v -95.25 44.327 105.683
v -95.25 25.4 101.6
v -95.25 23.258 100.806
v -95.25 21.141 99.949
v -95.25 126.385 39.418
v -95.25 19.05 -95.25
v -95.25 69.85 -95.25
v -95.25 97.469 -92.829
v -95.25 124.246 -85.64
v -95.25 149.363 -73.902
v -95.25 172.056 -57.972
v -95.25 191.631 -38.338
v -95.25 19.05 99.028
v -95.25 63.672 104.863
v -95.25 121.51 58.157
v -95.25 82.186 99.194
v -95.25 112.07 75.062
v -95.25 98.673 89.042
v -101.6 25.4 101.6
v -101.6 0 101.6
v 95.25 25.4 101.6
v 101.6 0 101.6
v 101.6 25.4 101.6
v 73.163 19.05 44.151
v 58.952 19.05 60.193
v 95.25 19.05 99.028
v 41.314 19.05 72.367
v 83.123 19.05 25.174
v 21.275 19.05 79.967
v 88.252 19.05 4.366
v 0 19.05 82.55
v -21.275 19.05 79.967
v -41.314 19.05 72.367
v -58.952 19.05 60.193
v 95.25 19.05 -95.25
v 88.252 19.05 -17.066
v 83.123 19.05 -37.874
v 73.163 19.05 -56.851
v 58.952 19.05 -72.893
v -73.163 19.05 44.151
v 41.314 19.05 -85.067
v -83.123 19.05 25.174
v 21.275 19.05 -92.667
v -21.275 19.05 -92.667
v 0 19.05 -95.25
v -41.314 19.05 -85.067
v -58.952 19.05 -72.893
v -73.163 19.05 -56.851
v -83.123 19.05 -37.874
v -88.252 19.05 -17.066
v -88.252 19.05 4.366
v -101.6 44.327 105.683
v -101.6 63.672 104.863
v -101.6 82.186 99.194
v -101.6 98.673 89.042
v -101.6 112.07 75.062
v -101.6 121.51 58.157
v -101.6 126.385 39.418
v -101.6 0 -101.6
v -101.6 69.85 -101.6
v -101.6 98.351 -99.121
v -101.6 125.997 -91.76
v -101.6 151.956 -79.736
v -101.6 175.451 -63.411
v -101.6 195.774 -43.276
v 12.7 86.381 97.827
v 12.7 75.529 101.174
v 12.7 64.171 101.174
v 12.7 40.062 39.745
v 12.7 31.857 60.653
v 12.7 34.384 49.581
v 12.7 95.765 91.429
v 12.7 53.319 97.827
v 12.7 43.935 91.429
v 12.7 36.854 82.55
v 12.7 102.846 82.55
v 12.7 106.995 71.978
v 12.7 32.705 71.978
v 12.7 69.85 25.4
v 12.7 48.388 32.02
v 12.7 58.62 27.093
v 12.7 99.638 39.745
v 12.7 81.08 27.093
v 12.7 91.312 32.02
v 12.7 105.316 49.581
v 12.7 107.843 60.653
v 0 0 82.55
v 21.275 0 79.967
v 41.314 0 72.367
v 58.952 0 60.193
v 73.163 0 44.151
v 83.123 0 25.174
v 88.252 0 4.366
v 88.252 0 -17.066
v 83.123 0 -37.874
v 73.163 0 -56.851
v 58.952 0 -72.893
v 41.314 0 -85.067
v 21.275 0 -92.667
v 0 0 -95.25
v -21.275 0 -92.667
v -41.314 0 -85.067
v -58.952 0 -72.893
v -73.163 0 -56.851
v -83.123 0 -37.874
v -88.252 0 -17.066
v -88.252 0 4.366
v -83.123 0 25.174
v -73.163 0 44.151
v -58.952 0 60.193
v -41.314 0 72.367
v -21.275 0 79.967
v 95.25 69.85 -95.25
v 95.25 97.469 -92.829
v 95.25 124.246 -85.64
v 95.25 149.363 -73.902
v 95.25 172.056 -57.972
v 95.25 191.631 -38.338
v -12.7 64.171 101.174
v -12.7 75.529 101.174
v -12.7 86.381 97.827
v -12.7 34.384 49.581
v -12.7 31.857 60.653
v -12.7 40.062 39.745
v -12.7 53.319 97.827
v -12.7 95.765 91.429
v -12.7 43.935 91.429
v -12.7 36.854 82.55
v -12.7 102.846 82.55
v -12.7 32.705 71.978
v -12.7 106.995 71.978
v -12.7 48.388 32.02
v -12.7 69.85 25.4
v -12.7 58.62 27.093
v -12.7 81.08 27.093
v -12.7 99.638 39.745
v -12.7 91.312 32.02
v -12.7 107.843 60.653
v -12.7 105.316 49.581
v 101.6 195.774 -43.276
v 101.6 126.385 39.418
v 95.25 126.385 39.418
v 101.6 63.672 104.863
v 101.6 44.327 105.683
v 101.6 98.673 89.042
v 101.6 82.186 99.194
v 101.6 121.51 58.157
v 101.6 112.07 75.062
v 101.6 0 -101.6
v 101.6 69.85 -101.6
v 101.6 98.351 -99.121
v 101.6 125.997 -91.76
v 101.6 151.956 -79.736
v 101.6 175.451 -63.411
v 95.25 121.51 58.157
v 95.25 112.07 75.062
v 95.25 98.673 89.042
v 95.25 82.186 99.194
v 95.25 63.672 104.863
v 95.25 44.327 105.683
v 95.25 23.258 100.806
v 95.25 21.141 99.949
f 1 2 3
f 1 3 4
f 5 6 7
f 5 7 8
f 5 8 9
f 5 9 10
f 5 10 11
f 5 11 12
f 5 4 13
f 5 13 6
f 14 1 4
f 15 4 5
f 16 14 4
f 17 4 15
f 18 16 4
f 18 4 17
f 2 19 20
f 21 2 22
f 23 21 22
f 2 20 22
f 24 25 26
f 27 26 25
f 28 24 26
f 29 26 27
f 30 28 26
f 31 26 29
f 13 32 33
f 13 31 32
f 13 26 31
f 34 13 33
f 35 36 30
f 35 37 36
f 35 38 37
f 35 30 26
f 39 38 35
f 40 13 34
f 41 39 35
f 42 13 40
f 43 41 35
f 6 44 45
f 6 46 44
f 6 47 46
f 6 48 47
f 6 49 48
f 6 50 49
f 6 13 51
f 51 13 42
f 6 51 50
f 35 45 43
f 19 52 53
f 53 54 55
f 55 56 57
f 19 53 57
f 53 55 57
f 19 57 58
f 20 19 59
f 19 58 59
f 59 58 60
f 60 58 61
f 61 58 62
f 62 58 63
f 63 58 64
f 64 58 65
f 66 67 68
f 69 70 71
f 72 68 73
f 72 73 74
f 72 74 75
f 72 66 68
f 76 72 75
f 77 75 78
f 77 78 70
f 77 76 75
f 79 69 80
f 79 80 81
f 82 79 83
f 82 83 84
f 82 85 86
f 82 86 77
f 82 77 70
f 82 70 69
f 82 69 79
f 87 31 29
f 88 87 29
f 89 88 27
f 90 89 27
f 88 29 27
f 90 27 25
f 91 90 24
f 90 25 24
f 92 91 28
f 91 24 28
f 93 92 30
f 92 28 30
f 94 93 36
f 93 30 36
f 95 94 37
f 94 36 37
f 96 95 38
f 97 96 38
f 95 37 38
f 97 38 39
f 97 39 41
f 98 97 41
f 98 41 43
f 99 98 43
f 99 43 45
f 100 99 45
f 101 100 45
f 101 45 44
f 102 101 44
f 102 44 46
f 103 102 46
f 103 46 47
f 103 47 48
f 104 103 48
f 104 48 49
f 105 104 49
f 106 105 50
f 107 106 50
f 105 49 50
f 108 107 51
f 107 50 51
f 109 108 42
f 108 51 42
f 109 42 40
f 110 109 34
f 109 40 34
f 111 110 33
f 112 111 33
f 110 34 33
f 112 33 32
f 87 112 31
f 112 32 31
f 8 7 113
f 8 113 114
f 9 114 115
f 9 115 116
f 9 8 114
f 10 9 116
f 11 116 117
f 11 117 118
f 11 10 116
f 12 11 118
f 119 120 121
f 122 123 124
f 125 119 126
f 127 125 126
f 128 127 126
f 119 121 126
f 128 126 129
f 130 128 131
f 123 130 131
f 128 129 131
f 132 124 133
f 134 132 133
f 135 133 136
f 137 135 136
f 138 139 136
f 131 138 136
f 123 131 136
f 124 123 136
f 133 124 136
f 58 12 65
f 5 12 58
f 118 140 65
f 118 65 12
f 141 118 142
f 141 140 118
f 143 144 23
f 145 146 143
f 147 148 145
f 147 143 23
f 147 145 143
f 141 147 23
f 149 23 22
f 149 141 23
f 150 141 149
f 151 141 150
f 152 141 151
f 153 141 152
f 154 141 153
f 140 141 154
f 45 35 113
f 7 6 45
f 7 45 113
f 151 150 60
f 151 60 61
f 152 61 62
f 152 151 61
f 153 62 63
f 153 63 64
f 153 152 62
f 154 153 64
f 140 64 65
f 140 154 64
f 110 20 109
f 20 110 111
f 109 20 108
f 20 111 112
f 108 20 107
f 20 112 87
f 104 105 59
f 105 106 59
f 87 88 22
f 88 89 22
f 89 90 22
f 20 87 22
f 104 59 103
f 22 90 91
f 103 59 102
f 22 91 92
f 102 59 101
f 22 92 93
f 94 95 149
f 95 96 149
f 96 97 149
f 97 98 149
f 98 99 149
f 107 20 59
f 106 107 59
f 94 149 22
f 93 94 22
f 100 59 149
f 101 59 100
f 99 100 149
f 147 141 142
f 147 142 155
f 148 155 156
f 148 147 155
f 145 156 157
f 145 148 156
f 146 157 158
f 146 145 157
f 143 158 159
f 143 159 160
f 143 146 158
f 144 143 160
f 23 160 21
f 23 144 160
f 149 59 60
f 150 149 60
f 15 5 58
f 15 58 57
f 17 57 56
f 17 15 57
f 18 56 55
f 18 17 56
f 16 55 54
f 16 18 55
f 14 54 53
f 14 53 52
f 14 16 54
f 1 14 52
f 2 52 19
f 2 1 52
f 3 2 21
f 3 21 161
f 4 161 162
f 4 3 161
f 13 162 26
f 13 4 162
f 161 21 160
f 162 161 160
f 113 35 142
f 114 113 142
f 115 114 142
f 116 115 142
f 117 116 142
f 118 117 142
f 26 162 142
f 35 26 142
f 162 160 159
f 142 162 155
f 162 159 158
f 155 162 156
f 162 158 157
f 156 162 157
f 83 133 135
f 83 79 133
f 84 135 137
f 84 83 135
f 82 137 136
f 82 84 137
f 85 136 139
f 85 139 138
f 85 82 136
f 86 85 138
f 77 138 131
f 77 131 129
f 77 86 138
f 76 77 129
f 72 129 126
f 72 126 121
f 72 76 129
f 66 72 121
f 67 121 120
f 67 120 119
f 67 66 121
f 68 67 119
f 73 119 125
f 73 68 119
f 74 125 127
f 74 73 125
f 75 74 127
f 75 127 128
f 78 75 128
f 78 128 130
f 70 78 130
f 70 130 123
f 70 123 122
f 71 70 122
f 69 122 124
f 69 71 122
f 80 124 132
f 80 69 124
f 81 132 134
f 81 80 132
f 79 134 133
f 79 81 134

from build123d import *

# Parameters (mm, degrees)
SKETCH2_W           = 203.2
SKETCH2_H           = 203.2
BOSS_EXTRUDE1_DEPTH = 25.4
BOSS_EXTRUDE2_DEPTH = 203.2
SHELL1_START        = -95.25
SHELL1_DEPTH        = 190.5
SKETCH6_R           = 38.1
BOSS_EXTRUDE3_DEPTH = 12.7
SKETCH7_R           = 88.9
CUT_EXTRUDE1_DEPTH  = 230.741261845


# Read off the part's stored shape, not the designer's step: Shell1
with BuildPart() as part:
    # Sketch2 → Boss-Extrude1 (new body)
    with BuildSketch(Plane(origin=(0, 0, 0), x_dir=(1, 0, 0), z_dir=(0, 1, 0))):
        Rectangle(SKETCH2_W, SKETCH2_H)
    extrude(amount=BOSS_EXTRUDE1_DEPTH)

    # Sketch3 → Boss-Extrude2 (add)
    with BuildSketch(Plane(origin=(101.6, 0, 0), x_dir=(0, 0, -1), z_dir=(1, 0, 0))):
        with BuildLine():
            Line((-101.6, 25.4), (101.6, 25.4))
            Line((101.6, 25.4), (101.6, 69.85))
            ThreePointArc((101.6, 69.85), (86.311122378, 139.237589754), (43.276104035, 195.774078742))
            Line((43.276104035, 195.774078742), (-39.4183936, 126.385156277))
            ThreePointArc((-39.4183936, 126.385156277), (-94.643731282, 90.753416891), (-101.6, 25.4))
        make_face()
    extrude(amount=-BOSS_EXTRUDE2_DEPTH)

    # Shell1 outline → Shell1 (cut)
    with BuildSketch(Plane.YZ.offset(SHELL1_START)):
        with BuildLine():
            Line((19.05, -95.25), (69.85, -95.25))
            ThreePointArc((69.85, -95.25), (137.061401768, -80.31999156), (191.630702174, -38.338220124))
            Line((191.630702174, -38.338220124), (126.385156277, 39.4183936))
            ThreePointArc((126.385156277, 39.4183936), (90.753416891, 94.643731282), (25.4, 101.6))
            ThreePointArc((25.4, 101.6), (22.196082961, 100.385537214), (19.05, 99.028272959))
            Line((19.05, 99.028272959), (19.05, -95.25))
        make_face()
    extrude(amount=SHELL1_DEPTH, mode=Mode.SUBTRACT)

    # Sketch7 → Cut-Extrude1 (cut, through all)
    with BuildSketch(Plane(origin=(0, 19.05, 0), x_dir=(1, 0, 0), z_dir=(0, 1, 0))):
        with Locations(Location((0, 6.35, 0), (0, 0, 270))):
            Circle(SKETCH7_R)
    extrude(amount=-CUT_EXTRUDE1_DEPTH, mode=Mode.SUBTRACT)


with BuildPart() as body_2:
    # Sketch6 → Boss-Extrude3 (new, symmetric)
    with BuildSketch(Plane(origin=(0, 0, 0), x_dir=(0, 0, -1), z_dir=(1, 0, 0))):
        with Locations((-63.5, 69.85)):
            Circle(SKETCH6_R)
    extrude(amount=BOSS_EXTRUDE3_DEPTH, both=True)


solid = Compound([part.part, body_2.part])
